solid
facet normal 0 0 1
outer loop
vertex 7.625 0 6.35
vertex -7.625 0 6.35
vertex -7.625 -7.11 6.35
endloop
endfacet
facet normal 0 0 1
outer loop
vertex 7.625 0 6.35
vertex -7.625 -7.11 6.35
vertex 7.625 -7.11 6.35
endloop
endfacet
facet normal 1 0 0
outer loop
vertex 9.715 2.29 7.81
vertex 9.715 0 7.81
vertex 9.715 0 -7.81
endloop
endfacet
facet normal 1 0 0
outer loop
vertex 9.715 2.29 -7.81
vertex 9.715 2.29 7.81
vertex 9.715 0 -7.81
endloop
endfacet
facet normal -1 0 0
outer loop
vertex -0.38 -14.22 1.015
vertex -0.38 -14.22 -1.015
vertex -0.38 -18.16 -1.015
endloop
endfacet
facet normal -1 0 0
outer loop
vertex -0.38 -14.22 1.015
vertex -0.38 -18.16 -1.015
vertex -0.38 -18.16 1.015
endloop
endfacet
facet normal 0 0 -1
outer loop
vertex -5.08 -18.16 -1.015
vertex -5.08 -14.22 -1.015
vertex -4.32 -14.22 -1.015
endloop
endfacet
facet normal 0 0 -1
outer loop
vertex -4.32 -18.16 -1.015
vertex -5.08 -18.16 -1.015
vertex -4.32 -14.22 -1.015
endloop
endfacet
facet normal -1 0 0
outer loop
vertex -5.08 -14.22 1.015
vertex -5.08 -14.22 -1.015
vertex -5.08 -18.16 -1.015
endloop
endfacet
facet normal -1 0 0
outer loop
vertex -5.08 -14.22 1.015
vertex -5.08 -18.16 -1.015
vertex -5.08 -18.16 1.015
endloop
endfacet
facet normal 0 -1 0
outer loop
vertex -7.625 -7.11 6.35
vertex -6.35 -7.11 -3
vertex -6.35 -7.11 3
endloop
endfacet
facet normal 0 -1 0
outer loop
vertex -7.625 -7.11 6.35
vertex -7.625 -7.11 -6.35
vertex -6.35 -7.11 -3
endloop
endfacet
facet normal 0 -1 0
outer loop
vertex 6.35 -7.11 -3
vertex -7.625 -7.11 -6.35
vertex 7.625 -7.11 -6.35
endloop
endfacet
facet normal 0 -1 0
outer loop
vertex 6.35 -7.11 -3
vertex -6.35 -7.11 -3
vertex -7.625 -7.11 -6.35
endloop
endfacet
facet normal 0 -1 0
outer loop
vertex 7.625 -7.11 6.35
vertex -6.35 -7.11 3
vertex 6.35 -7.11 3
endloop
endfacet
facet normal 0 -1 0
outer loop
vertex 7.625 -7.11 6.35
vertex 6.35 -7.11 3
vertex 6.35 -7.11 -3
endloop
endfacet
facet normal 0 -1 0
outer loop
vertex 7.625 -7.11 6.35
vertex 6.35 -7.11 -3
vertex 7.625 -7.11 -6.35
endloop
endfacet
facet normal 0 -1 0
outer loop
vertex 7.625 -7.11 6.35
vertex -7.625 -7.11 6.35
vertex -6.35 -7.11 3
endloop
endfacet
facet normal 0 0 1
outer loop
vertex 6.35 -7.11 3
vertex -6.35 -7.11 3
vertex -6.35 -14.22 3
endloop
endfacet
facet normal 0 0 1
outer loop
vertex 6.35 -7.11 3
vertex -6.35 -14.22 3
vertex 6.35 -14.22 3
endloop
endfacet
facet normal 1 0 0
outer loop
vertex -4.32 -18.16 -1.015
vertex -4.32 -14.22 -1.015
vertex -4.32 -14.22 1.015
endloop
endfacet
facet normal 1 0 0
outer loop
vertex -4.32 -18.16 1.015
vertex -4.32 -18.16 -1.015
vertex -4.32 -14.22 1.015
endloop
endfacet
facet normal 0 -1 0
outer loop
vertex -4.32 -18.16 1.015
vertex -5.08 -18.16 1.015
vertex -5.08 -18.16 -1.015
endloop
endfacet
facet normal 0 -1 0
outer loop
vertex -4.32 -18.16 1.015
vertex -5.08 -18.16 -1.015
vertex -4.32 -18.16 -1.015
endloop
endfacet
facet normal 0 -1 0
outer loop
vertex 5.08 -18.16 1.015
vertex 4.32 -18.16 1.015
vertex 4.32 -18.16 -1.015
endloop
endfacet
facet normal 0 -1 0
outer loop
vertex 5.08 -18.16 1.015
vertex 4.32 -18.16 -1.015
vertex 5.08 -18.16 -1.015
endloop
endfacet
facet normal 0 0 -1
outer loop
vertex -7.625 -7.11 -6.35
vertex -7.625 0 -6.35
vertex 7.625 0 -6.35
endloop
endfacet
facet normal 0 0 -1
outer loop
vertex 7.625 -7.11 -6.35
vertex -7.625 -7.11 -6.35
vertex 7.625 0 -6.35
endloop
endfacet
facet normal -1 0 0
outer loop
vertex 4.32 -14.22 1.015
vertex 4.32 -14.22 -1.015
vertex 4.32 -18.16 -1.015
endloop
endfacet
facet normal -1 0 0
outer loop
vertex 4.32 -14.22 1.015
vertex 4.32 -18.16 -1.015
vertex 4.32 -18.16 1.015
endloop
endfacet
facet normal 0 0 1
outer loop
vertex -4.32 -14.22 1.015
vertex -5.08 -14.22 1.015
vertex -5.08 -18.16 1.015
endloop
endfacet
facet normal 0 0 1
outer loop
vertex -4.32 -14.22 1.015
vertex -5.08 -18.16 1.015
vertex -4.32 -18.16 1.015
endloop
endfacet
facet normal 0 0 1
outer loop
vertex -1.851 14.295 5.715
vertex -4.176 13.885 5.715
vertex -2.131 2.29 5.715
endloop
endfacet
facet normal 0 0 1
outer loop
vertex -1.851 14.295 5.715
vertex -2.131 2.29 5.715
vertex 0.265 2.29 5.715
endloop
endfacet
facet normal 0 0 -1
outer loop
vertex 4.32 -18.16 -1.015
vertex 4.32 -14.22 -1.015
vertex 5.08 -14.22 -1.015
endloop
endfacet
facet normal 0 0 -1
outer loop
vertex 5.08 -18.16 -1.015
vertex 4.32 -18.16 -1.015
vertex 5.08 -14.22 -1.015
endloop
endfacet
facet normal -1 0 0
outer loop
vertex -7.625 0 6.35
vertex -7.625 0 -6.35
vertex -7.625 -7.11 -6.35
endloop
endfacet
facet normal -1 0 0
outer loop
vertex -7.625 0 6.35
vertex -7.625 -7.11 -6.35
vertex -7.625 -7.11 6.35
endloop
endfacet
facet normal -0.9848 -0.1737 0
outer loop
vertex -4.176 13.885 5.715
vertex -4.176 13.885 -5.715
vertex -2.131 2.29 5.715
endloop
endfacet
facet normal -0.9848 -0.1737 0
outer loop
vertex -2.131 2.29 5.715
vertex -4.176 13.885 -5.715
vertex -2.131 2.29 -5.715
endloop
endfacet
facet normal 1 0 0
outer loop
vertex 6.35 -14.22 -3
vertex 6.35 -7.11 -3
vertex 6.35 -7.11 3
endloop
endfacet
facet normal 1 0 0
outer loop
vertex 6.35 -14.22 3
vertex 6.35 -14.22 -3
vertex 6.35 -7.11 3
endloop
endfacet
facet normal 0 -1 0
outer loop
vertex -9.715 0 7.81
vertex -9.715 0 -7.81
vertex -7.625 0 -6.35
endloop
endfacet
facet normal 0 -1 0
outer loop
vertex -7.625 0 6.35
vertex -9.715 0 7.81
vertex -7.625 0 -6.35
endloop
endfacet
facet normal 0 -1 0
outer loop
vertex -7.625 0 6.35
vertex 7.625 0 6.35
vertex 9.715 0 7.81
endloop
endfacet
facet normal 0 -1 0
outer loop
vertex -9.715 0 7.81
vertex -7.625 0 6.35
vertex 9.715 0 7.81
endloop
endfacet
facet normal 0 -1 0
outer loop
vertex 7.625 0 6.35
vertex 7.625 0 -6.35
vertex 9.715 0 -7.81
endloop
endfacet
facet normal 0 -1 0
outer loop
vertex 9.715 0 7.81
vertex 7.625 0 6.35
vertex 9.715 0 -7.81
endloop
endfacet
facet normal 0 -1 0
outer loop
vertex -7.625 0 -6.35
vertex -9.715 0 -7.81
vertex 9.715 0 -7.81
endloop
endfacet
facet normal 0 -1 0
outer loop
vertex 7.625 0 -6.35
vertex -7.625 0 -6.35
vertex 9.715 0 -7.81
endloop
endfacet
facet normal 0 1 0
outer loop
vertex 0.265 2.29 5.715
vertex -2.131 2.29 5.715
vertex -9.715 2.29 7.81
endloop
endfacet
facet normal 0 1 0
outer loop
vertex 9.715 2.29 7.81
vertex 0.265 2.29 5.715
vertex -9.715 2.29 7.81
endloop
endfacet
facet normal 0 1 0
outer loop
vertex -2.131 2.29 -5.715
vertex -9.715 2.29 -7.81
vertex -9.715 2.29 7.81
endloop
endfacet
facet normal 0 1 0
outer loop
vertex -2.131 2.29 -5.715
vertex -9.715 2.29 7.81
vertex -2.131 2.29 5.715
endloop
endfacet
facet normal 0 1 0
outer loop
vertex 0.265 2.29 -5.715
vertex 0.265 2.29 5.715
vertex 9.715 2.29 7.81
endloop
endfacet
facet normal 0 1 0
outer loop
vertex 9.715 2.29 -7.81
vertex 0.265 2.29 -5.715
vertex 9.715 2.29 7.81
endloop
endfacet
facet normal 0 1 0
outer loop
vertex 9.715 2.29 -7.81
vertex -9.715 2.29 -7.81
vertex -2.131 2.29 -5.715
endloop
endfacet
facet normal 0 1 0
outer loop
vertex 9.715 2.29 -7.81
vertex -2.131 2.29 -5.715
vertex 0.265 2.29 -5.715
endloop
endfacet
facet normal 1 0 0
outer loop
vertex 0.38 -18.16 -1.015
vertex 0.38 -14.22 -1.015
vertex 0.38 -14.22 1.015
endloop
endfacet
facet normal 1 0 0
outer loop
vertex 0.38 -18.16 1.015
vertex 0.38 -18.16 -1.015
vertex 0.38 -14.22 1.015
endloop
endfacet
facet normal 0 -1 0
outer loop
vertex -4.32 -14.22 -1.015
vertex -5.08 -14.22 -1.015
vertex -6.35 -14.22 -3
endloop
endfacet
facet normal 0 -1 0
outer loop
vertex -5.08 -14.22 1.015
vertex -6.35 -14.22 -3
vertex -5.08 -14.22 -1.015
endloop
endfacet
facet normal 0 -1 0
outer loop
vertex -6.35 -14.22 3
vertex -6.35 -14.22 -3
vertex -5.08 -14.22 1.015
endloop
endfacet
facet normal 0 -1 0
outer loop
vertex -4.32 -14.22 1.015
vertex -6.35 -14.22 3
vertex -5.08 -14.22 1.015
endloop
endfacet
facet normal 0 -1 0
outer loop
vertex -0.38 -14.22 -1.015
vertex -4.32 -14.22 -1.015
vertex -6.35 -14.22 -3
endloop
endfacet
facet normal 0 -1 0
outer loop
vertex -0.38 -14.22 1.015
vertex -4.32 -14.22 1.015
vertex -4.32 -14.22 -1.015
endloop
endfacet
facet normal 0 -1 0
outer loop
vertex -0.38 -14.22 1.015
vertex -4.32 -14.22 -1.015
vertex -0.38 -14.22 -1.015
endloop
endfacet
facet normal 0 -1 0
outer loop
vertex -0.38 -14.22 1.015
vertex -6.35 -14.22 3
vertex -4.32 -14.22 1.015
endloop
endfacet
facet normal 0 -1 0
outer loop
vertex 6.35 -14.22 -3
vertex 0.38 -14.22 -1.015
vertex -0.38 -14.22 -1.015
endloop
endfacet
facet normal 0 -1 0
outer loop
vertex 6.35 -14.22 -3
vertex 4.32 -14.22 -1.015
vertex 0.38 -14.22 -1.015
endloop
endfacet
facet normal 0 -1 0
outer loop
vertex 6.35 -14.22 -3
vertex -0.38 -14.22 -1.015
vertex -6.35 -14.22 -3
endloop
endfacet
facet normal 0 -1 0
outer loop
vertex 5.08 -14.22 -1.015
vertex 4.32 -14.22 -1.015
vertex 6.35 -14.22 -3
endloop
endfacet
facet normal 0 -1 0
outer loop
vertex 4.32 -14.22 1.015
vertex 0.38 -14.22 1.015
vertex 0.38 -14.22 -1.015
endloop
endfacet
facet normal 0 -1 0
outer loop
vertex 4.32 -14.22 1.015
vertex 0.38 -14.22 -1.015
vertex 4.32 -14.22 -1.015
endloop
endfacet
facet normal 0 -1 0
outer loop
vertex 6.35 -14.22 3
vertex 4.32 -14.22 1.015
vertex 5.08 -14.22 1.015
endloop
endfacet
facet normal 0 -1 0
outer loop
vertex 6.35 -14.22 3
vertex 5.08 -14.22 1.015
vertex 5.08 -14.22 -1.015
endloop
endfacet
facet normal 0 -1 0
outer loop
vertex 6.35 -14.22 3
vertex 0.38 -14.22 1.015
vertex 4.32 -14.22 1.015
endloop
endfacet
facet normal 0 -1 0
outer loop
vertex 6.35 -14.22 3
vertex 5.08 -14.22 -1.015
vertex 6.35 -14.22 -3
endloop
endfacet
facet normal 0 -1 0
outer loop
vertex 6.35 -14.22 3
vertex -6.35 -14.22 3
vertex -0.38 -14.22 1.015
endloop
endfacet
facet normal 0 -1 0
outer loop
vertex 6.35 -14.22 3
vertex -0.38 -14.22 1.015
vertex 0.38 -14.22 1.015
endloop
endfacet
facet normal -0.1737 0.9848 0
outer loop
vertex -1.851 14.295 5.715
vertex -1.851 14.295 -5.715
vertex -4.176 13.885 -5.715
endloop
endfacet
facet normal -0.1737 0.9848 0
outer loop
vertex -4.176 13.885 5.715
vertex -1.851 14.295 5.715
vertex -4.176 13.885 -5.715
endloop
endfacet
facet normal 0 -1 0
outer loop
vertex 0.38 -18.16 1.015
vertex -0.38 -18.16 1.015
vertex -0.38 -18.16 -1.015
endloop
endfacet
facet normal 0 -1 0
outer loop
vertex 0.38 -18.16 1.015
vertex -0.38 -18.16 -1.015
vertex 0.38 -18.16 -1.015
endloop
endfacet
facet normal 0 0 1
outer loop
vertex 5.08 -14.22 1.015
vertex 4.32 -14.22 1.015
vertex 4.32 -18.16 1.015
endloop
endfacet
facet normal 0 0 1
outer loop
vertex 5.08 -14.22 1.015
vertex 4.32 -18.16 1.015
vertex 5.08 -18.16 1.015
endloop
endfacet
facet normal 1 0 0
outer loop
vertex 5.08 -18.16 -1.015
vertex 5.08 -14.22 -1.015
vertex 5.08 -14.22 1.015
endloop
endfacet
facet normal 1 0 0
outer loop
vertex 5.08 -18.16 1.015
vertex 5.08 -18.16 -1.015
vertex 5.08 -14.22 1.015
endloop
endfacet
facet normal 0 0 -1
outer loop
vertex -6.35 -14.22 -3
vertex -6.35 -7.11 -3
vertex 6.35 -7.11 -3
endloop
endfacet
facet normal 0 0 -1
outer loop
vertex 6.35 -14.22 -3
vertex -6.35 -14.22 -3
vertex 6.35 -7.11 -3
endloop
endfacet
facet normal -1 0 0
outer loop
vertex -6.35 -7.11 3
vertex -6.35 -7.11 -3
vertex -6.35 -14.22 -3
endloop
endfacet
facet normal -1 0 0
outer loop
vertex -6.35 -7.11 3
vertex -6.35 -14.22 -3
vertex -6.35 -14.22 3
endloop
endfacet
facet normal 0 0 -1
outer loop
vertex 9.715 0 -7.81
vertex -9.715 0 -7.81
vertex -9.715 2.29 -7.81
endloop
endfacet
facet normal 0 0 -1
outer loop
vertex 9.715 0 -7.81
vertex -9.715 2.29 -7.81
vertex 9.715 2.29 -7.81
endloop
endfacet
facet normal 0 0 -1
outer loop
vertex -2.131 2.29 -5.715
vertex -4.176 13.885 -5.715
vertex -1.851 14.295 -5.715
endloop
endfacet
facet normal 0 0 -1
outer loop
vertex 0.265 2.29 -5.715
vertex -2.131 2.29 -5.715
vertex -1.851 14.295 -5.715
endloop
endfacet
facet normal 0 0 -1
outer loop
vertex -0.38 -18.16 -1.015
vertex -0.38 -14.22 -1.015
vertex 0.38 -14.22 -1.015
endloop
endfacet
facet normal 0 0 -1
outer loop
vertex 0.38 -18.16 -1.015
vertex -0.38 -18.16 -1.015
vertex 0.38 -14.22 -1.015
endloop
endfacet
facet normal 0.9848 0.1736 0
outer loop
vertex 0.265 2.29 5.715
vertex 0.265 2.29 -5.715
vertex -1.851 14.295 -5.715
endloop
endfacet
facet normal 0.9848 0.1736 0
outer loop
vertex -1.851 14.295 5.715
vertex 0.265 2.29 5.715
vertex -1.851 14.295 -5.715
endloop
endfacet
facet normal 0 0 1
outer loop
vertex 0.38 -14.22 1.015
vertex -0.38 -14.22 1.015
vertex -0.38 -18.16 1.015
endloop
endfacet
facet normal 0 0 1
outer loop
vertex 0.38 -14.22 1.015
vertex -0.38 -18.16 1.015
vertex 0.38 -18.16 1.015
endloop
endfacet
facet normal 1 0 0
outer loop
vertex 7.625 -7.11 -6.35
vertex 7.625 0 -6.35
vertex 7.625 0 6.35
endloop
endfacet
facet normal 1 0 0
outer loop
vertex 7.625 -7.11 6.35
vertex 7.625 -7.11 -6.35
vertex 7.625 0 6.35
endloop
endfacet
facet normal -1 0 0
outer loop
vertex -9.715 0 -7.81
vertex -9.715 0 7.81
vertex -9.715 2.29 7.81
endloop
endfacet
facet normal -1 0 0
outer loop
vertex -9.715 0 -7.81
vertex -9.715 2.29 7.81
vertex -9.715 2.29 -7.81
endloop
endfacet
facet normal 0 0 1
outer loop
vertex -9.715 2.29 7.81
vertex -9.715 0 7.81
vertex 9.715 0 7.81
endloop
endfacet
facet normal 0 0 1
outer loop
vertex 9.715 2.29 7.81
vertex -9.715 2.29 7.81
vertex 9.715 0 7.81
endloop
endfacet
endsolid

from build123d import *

# Parameters (mm, degrees)
SKETCH1_W                = 19.43
SKETCH1_H                = 15.62
BOSS_EXTRUDE1_DEPTH      = 2.29
SKETCH5_W                = 15.25
SKETCH5_H                = 12.7
BOSS_EXTRUDE2_DEPTH      = 7.11
SKETCH6_W                = 12.7
SKETCH6_H                = 6
BOSS_EXTRUDE3_DEPTH      = 7.11
SKETCH7_W                = 0.76
SKETCH7_H                = 2.03
BOSS_EXTRUDE4_DEPTH      = 3.94
BOSS_EXTRUDE5_DEPTH      = 5.715
BOSS_EXTRUDE5_DEPTH_BACK = 5.715


with BuildPart() as part:
    # Sketch1 → Boss-Extrude1 (new body)
    with BuildSketch(Plane(origin=(0, 0, 0), x_dir=(1, 0, 0), z_dir=(0, 1, 0))):
        Rectangle(SKETCH1_W, SKETCH1_H)
    extrude(amount=BOSS_EXTRUDE1_DEPTH)

    # Sketch5 → Boss-Extrude2 (add)
    with BuildSketch(Plane.XZ):
        Rectangle(SKETCH5_W, SKETCH5_H)
    extrude(amount=BOSS_EXTRUDE2_DEPTH)

    # Sketch6 → Boss-Extrude3 (add)
    with BuildSketch(Plane.XZ.offset(7.11)):
        Rectangle(SKETCH6_W, SKETCH6_H)
    extrude(amount=BOSS_EXTRUDE3_DEPTH)

    # Sketch7 → Boss-Extrude4 (add)
    with BuildSketch(Plane.XZ.offset(14.22)):
        Rectangle(SKETCH7_W, SKETCH7_H)
        with Locations((-4.7, 0)):
            Rectangle(SKETCH7_W, SKETCH7_H)
        with Locations((4.7, 0)):
            Rectangle(SKETCH7_W, SKETCH7_H)
    extrude(amount=BOSS_EXTRUDE4_DEPTH)

    # Sketch8 → Boss-Extrude5 (add, two sides: drawn at the far end of the back side and taken through both)
    with BuildSketch(Plane.XY.offset(-BOSS_EXTRUDE5_DEPTH_BACK)):
        Polygon((-1.162073149, -3.20490485), (1.162073149, -2.79509515), (-1.851354952, 14.29490485), (-4.175501249, 13.88509515), align=None)
    extrude(amount=BOSS_EXTRUDE5_DEPTH + BOSS_EXTRUDE5_DEPTH_BACK)


solid = part.part
